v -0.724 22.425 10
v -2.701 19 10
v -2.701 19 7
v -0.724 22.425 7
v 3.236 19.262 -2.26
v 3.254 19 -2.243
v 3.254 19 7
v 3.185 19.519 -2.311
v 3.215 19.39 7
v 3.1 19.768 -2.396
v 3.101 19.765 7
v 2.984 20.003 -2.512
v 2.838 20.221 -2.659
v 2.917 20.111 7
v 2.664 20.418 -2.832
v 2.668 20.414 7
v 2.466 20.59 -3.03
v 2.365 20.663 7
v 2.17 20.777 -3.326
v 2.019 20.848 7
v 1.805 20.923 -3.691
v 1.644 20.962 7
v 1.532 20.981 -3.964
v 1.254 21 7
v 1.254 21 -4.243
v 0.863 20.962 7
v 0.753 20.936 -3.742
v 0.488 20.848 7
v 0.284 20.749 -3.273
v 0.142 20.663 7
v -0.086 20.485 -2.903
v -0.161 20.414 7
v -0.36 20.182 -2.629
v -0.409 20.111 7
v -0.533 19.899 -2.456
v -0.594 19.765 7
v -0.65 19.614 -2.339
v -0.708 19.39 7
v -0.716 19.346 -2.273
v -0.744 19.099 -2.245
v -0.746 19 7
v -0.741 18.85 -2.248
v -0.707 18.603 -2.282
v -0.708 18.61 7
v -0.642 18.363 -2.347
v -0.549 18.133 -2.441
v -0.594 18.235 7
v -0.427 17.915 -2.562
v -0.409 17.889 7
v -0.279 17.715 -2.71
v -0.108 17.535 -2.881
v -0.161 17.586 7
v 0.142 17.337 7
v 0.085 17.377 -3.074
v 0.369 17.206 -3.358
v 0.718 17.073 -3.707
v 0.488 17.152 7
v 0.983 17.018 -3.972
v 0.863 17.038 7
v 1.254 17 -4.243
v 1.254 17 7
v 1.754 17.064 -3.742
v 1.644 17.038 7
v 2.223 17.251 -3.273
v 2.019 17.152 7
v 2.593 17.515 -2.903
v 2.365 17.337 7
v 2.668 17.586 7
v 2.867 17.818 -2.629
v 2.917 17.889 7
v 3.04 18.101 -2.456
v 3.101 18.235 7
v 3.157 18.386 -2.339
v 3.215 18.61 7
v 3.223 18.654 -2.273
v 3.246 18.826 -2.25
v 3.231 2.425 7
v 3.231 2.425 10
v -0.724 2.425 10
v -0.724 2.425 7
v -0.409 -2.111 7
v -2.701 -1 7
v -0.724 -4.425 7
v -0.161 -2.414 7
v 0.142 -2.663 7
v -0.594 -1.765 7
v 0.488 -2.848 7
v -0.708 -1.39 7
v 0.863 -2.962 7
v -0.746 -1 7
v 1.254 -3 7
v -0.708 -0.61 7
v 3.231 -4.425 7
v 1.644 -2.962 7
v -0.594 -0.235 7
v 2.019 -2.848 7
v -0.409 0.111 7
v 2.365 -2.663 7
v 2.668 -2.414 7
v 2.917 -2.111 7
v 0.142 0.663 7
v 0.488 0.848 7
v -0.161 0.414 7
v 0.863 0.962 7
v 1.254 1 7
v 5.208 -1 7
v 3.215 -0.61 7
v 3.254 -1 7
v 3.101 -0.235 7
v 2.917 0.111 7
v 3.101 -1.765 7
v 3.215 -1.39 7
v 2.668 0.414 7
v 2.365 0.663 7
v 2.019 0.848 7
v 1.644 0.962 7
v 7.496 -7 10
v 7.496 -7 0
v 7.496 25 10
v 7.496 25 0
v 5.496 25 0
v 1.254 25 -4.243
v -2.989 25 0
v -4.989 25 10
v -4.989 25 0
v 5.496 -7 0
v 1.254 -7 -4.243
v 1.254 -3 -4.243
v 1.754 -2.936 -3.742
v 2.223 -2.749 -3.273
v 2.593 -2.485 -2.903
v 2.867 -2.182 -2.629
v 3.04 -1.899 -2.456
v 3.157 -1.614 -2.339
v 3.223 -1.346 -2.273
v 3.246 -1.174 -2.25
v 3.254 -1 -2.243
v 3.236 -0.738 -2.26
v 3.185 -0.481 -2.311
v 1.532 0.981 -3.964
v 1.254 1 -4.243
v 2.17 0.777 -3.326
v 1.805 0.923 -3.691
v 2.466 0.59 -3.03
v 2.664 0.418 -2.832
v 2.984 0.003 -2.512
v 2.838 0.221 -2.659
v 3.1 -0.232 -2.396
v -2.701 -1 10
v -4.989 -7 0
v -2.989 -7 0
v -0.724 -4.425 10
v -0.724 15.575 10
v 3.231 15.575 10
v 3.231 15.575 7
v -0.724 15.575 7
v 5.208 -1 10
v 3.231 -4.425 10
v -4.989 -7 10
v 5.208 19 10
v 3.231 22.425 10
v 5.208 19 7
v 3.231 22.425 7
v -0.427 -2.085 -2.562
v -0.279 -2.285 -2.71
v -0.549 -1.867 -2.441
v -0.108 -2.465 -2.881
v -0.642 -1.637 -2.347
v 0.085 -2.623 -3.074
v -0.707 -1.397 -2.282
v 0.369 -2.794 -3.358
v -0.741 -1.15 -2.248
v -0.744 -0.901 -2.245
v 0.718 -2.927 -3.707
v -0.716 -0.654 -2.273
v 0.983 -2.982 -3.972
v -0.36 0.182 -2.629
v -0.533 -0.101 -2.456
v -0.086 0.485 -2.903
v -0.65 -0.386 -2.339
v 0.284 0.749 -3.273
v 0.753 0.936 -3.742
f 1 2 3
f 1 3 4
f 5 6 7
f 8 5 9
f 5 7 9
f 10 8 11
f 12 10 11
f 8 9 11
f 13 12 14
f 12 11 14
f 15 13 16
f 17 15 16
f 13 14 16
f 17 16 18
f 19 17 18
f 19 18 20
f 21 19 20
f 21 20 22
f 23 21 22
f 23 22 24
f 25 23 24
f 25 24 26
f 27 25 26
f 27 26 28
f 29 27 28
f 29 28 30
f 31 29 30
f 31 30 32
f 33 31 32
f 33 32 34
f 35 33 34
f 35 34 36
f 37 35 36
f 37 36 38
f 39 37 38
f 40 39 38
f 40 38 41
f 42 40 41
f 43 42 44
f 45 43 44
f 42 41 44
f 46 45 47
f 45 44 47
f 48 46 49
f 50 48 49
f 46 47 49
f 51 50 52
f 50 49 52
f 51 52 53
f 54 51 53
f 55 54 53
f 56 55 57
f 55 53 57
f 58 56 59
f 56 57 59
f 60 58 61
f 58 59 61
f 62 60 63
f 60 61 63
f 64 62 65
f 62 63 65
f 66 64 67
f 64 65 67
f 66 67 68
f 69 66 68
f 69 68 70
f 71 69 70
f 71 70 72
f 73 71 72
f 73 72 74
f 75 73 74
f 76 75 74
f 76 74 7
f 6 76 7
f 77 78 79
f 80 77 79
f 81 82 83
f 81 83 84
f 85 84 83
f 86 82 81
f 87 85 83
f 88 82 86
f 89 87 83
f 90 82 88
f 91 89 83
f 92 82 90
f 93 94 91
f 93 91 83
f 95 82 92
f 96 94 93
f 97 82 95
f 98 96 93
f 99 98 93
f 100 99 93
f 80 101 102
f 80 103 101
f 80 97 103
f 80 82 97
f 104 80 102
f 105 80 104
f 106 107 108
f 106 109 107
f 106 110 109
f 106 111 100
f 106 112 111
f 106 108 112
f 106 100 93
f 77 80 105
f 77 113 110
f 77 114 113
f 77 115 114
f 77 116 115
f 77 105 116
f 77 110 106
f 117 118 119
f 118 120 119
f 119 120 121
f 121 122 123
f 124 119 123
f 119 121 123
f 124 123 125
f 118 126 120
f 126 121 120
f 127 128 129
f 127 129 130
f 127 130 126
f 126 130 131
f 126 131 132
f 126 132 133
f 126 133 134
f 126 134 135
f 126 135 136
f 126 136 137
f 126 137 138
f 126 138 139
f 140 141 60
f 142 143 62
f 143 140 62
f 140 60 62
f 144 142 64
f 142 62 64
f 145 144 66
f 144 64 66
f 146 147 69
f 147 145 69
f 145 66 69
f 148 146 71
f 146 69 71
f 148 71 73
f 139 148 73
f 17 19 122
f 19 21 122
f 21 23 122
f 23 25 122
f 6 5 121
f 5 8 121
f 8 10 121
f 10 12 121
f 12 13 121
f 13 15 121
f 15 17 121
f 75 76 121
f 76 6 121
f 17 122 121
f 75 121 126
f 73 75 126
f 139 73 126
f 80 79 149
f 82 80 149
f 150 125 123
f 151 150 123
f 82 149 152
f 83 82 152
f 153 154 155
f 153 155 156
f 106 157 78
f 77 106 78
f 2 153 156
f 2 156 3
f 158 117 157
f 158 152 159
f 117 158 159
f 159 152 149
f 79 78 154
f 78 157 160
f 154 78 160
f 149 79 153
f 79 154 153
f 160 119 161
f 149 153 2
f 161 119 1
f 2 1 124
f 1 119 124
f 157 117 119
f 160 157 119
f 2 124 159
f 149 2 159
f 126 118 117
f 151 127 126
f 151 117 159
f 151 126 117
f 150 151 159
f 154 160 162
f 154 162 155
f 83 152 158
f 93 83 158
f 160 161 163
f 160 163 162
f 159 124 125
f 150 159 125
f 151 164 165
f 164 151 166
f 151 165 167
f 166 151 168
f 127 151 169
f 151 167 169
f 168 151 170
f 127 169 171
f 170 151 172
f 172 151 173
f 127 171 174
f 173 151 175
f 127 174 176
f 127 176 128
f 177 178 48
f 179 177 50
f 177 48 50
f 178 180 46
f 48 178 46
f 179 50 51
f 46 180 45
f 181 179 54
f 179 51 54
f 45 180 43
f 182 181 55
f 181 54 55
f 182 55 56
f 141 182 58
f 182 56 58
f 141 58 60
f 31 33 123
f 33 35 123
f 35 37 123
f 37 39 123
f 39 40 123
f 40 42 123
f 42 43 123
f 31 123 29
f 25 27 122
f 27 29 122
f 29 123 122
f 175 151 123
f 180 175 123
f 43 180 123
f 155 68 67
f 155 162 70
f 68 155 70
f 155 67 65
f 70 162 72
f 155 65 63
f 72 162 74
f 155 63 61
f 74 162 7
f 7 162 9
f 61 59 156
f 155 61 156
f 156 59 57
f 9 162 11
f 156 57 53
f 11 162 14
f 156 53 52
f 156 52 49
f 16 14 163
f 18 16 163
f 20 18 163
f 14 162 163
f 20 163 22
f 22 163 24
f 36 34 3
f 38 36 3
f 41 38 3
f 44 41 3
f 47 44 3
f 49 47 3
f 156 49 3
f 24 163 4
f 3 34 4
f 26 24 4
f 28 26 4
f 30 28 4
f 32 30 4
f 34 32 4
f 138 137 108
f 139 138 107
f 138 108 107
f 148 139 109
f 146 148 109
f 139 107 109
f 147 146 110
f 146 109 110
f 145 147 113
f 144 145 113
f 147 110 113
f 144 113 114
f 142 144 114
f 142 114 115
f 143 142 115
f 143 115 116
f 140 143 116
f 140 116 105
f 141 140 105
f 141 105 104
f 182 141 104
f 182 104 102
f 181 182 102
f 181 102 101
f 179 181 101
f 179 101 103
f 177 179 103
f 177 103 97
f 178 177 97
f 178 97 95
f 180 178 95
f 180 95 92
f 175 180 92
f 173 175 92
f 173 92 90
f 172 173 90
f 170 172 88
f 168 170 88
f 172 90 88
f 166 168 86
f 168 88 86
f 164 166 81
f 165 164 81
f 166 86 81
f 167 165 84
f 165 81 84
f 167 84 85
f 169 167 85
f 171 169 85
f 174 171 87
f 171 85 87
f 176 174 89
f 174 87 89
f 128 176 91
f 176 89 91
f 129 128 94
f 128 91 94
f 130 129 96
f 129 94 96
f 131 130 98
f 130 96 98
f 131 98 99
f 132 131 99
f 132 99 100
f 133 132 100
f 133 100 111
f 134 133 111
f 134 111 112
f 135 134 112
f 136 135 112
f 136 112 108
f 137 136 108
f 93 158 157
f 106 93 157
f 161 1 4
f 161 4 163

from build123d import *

# Parameters (mm, degrees)
BOSS_EXTRUDE1_DEPTH      = 25
BOSS_EXTRUDE1_DEPTH_BACK = 7
SKETCH3_R                = 2
CUT_EXTRUDE1_DEPTH       = 25
CUT_EXTRUDE2_DEPTH       = 3


with BuildPart() as part:
    # Sketch2 → Boss-Extrude1 (new body, two sides)
    with BuildSketch(Plane(origin=(0, 0, 0), x_dir=(1, 0, 0), z_dir=(0, 1, 0))) as boss_extrude1_sk:
        Polygon((-4.989079304, 0), (-2.989079304, 0), (1.253561383, 4.242640687), (5.49620207, 0), (7.49620207, 0), (7.49620207, -10), (-4.989079304, -10), align=None)
    extrude(amount=BOSS_EXTRUDE1_DEPTH)
    extrude(boss_extrude1_sk.sketch, amount=-BOSS_EXTRUDE1_DEPTH_BACK)

    # Sketch3 → Cut-Extrude1 (cut)
    with BuildSketch(Plane.XY.offset(10)):
        with Locations((1.253561383, 19)):
            Circle(SKETCH3_R)
        with Locations((1.253561383, -1)):
            Circle(SKETCH3_R)
    extrude(amount=-CUT_EXTRUDE1_DEPTH, mode=Mode.SUBTRACT)

    # Sketch4 → Cut-Extrude2 (cut)
    with BuildSketch(Plane.XY.offset(10)):
        Polygon((5.208410727, -1), (3.230986055, 2.425), (-0.723863289, 2.425), (-2.701287961, -1), (-0.723863289, -4.425), (3.230986055, -4.425), align=None)
        Polygon((3.230986055, 22.425), (5.208410727, 19), (3.230986055, 15.575), (-0.723863289, 15.575), (-2.701287961, 19), (-0.723863289, 22.425), align=None)
    extrude(amount=-CUT_EXTRUDE2_DEPTH, mode=Mode.SUBTRACT)


solid = part.part
